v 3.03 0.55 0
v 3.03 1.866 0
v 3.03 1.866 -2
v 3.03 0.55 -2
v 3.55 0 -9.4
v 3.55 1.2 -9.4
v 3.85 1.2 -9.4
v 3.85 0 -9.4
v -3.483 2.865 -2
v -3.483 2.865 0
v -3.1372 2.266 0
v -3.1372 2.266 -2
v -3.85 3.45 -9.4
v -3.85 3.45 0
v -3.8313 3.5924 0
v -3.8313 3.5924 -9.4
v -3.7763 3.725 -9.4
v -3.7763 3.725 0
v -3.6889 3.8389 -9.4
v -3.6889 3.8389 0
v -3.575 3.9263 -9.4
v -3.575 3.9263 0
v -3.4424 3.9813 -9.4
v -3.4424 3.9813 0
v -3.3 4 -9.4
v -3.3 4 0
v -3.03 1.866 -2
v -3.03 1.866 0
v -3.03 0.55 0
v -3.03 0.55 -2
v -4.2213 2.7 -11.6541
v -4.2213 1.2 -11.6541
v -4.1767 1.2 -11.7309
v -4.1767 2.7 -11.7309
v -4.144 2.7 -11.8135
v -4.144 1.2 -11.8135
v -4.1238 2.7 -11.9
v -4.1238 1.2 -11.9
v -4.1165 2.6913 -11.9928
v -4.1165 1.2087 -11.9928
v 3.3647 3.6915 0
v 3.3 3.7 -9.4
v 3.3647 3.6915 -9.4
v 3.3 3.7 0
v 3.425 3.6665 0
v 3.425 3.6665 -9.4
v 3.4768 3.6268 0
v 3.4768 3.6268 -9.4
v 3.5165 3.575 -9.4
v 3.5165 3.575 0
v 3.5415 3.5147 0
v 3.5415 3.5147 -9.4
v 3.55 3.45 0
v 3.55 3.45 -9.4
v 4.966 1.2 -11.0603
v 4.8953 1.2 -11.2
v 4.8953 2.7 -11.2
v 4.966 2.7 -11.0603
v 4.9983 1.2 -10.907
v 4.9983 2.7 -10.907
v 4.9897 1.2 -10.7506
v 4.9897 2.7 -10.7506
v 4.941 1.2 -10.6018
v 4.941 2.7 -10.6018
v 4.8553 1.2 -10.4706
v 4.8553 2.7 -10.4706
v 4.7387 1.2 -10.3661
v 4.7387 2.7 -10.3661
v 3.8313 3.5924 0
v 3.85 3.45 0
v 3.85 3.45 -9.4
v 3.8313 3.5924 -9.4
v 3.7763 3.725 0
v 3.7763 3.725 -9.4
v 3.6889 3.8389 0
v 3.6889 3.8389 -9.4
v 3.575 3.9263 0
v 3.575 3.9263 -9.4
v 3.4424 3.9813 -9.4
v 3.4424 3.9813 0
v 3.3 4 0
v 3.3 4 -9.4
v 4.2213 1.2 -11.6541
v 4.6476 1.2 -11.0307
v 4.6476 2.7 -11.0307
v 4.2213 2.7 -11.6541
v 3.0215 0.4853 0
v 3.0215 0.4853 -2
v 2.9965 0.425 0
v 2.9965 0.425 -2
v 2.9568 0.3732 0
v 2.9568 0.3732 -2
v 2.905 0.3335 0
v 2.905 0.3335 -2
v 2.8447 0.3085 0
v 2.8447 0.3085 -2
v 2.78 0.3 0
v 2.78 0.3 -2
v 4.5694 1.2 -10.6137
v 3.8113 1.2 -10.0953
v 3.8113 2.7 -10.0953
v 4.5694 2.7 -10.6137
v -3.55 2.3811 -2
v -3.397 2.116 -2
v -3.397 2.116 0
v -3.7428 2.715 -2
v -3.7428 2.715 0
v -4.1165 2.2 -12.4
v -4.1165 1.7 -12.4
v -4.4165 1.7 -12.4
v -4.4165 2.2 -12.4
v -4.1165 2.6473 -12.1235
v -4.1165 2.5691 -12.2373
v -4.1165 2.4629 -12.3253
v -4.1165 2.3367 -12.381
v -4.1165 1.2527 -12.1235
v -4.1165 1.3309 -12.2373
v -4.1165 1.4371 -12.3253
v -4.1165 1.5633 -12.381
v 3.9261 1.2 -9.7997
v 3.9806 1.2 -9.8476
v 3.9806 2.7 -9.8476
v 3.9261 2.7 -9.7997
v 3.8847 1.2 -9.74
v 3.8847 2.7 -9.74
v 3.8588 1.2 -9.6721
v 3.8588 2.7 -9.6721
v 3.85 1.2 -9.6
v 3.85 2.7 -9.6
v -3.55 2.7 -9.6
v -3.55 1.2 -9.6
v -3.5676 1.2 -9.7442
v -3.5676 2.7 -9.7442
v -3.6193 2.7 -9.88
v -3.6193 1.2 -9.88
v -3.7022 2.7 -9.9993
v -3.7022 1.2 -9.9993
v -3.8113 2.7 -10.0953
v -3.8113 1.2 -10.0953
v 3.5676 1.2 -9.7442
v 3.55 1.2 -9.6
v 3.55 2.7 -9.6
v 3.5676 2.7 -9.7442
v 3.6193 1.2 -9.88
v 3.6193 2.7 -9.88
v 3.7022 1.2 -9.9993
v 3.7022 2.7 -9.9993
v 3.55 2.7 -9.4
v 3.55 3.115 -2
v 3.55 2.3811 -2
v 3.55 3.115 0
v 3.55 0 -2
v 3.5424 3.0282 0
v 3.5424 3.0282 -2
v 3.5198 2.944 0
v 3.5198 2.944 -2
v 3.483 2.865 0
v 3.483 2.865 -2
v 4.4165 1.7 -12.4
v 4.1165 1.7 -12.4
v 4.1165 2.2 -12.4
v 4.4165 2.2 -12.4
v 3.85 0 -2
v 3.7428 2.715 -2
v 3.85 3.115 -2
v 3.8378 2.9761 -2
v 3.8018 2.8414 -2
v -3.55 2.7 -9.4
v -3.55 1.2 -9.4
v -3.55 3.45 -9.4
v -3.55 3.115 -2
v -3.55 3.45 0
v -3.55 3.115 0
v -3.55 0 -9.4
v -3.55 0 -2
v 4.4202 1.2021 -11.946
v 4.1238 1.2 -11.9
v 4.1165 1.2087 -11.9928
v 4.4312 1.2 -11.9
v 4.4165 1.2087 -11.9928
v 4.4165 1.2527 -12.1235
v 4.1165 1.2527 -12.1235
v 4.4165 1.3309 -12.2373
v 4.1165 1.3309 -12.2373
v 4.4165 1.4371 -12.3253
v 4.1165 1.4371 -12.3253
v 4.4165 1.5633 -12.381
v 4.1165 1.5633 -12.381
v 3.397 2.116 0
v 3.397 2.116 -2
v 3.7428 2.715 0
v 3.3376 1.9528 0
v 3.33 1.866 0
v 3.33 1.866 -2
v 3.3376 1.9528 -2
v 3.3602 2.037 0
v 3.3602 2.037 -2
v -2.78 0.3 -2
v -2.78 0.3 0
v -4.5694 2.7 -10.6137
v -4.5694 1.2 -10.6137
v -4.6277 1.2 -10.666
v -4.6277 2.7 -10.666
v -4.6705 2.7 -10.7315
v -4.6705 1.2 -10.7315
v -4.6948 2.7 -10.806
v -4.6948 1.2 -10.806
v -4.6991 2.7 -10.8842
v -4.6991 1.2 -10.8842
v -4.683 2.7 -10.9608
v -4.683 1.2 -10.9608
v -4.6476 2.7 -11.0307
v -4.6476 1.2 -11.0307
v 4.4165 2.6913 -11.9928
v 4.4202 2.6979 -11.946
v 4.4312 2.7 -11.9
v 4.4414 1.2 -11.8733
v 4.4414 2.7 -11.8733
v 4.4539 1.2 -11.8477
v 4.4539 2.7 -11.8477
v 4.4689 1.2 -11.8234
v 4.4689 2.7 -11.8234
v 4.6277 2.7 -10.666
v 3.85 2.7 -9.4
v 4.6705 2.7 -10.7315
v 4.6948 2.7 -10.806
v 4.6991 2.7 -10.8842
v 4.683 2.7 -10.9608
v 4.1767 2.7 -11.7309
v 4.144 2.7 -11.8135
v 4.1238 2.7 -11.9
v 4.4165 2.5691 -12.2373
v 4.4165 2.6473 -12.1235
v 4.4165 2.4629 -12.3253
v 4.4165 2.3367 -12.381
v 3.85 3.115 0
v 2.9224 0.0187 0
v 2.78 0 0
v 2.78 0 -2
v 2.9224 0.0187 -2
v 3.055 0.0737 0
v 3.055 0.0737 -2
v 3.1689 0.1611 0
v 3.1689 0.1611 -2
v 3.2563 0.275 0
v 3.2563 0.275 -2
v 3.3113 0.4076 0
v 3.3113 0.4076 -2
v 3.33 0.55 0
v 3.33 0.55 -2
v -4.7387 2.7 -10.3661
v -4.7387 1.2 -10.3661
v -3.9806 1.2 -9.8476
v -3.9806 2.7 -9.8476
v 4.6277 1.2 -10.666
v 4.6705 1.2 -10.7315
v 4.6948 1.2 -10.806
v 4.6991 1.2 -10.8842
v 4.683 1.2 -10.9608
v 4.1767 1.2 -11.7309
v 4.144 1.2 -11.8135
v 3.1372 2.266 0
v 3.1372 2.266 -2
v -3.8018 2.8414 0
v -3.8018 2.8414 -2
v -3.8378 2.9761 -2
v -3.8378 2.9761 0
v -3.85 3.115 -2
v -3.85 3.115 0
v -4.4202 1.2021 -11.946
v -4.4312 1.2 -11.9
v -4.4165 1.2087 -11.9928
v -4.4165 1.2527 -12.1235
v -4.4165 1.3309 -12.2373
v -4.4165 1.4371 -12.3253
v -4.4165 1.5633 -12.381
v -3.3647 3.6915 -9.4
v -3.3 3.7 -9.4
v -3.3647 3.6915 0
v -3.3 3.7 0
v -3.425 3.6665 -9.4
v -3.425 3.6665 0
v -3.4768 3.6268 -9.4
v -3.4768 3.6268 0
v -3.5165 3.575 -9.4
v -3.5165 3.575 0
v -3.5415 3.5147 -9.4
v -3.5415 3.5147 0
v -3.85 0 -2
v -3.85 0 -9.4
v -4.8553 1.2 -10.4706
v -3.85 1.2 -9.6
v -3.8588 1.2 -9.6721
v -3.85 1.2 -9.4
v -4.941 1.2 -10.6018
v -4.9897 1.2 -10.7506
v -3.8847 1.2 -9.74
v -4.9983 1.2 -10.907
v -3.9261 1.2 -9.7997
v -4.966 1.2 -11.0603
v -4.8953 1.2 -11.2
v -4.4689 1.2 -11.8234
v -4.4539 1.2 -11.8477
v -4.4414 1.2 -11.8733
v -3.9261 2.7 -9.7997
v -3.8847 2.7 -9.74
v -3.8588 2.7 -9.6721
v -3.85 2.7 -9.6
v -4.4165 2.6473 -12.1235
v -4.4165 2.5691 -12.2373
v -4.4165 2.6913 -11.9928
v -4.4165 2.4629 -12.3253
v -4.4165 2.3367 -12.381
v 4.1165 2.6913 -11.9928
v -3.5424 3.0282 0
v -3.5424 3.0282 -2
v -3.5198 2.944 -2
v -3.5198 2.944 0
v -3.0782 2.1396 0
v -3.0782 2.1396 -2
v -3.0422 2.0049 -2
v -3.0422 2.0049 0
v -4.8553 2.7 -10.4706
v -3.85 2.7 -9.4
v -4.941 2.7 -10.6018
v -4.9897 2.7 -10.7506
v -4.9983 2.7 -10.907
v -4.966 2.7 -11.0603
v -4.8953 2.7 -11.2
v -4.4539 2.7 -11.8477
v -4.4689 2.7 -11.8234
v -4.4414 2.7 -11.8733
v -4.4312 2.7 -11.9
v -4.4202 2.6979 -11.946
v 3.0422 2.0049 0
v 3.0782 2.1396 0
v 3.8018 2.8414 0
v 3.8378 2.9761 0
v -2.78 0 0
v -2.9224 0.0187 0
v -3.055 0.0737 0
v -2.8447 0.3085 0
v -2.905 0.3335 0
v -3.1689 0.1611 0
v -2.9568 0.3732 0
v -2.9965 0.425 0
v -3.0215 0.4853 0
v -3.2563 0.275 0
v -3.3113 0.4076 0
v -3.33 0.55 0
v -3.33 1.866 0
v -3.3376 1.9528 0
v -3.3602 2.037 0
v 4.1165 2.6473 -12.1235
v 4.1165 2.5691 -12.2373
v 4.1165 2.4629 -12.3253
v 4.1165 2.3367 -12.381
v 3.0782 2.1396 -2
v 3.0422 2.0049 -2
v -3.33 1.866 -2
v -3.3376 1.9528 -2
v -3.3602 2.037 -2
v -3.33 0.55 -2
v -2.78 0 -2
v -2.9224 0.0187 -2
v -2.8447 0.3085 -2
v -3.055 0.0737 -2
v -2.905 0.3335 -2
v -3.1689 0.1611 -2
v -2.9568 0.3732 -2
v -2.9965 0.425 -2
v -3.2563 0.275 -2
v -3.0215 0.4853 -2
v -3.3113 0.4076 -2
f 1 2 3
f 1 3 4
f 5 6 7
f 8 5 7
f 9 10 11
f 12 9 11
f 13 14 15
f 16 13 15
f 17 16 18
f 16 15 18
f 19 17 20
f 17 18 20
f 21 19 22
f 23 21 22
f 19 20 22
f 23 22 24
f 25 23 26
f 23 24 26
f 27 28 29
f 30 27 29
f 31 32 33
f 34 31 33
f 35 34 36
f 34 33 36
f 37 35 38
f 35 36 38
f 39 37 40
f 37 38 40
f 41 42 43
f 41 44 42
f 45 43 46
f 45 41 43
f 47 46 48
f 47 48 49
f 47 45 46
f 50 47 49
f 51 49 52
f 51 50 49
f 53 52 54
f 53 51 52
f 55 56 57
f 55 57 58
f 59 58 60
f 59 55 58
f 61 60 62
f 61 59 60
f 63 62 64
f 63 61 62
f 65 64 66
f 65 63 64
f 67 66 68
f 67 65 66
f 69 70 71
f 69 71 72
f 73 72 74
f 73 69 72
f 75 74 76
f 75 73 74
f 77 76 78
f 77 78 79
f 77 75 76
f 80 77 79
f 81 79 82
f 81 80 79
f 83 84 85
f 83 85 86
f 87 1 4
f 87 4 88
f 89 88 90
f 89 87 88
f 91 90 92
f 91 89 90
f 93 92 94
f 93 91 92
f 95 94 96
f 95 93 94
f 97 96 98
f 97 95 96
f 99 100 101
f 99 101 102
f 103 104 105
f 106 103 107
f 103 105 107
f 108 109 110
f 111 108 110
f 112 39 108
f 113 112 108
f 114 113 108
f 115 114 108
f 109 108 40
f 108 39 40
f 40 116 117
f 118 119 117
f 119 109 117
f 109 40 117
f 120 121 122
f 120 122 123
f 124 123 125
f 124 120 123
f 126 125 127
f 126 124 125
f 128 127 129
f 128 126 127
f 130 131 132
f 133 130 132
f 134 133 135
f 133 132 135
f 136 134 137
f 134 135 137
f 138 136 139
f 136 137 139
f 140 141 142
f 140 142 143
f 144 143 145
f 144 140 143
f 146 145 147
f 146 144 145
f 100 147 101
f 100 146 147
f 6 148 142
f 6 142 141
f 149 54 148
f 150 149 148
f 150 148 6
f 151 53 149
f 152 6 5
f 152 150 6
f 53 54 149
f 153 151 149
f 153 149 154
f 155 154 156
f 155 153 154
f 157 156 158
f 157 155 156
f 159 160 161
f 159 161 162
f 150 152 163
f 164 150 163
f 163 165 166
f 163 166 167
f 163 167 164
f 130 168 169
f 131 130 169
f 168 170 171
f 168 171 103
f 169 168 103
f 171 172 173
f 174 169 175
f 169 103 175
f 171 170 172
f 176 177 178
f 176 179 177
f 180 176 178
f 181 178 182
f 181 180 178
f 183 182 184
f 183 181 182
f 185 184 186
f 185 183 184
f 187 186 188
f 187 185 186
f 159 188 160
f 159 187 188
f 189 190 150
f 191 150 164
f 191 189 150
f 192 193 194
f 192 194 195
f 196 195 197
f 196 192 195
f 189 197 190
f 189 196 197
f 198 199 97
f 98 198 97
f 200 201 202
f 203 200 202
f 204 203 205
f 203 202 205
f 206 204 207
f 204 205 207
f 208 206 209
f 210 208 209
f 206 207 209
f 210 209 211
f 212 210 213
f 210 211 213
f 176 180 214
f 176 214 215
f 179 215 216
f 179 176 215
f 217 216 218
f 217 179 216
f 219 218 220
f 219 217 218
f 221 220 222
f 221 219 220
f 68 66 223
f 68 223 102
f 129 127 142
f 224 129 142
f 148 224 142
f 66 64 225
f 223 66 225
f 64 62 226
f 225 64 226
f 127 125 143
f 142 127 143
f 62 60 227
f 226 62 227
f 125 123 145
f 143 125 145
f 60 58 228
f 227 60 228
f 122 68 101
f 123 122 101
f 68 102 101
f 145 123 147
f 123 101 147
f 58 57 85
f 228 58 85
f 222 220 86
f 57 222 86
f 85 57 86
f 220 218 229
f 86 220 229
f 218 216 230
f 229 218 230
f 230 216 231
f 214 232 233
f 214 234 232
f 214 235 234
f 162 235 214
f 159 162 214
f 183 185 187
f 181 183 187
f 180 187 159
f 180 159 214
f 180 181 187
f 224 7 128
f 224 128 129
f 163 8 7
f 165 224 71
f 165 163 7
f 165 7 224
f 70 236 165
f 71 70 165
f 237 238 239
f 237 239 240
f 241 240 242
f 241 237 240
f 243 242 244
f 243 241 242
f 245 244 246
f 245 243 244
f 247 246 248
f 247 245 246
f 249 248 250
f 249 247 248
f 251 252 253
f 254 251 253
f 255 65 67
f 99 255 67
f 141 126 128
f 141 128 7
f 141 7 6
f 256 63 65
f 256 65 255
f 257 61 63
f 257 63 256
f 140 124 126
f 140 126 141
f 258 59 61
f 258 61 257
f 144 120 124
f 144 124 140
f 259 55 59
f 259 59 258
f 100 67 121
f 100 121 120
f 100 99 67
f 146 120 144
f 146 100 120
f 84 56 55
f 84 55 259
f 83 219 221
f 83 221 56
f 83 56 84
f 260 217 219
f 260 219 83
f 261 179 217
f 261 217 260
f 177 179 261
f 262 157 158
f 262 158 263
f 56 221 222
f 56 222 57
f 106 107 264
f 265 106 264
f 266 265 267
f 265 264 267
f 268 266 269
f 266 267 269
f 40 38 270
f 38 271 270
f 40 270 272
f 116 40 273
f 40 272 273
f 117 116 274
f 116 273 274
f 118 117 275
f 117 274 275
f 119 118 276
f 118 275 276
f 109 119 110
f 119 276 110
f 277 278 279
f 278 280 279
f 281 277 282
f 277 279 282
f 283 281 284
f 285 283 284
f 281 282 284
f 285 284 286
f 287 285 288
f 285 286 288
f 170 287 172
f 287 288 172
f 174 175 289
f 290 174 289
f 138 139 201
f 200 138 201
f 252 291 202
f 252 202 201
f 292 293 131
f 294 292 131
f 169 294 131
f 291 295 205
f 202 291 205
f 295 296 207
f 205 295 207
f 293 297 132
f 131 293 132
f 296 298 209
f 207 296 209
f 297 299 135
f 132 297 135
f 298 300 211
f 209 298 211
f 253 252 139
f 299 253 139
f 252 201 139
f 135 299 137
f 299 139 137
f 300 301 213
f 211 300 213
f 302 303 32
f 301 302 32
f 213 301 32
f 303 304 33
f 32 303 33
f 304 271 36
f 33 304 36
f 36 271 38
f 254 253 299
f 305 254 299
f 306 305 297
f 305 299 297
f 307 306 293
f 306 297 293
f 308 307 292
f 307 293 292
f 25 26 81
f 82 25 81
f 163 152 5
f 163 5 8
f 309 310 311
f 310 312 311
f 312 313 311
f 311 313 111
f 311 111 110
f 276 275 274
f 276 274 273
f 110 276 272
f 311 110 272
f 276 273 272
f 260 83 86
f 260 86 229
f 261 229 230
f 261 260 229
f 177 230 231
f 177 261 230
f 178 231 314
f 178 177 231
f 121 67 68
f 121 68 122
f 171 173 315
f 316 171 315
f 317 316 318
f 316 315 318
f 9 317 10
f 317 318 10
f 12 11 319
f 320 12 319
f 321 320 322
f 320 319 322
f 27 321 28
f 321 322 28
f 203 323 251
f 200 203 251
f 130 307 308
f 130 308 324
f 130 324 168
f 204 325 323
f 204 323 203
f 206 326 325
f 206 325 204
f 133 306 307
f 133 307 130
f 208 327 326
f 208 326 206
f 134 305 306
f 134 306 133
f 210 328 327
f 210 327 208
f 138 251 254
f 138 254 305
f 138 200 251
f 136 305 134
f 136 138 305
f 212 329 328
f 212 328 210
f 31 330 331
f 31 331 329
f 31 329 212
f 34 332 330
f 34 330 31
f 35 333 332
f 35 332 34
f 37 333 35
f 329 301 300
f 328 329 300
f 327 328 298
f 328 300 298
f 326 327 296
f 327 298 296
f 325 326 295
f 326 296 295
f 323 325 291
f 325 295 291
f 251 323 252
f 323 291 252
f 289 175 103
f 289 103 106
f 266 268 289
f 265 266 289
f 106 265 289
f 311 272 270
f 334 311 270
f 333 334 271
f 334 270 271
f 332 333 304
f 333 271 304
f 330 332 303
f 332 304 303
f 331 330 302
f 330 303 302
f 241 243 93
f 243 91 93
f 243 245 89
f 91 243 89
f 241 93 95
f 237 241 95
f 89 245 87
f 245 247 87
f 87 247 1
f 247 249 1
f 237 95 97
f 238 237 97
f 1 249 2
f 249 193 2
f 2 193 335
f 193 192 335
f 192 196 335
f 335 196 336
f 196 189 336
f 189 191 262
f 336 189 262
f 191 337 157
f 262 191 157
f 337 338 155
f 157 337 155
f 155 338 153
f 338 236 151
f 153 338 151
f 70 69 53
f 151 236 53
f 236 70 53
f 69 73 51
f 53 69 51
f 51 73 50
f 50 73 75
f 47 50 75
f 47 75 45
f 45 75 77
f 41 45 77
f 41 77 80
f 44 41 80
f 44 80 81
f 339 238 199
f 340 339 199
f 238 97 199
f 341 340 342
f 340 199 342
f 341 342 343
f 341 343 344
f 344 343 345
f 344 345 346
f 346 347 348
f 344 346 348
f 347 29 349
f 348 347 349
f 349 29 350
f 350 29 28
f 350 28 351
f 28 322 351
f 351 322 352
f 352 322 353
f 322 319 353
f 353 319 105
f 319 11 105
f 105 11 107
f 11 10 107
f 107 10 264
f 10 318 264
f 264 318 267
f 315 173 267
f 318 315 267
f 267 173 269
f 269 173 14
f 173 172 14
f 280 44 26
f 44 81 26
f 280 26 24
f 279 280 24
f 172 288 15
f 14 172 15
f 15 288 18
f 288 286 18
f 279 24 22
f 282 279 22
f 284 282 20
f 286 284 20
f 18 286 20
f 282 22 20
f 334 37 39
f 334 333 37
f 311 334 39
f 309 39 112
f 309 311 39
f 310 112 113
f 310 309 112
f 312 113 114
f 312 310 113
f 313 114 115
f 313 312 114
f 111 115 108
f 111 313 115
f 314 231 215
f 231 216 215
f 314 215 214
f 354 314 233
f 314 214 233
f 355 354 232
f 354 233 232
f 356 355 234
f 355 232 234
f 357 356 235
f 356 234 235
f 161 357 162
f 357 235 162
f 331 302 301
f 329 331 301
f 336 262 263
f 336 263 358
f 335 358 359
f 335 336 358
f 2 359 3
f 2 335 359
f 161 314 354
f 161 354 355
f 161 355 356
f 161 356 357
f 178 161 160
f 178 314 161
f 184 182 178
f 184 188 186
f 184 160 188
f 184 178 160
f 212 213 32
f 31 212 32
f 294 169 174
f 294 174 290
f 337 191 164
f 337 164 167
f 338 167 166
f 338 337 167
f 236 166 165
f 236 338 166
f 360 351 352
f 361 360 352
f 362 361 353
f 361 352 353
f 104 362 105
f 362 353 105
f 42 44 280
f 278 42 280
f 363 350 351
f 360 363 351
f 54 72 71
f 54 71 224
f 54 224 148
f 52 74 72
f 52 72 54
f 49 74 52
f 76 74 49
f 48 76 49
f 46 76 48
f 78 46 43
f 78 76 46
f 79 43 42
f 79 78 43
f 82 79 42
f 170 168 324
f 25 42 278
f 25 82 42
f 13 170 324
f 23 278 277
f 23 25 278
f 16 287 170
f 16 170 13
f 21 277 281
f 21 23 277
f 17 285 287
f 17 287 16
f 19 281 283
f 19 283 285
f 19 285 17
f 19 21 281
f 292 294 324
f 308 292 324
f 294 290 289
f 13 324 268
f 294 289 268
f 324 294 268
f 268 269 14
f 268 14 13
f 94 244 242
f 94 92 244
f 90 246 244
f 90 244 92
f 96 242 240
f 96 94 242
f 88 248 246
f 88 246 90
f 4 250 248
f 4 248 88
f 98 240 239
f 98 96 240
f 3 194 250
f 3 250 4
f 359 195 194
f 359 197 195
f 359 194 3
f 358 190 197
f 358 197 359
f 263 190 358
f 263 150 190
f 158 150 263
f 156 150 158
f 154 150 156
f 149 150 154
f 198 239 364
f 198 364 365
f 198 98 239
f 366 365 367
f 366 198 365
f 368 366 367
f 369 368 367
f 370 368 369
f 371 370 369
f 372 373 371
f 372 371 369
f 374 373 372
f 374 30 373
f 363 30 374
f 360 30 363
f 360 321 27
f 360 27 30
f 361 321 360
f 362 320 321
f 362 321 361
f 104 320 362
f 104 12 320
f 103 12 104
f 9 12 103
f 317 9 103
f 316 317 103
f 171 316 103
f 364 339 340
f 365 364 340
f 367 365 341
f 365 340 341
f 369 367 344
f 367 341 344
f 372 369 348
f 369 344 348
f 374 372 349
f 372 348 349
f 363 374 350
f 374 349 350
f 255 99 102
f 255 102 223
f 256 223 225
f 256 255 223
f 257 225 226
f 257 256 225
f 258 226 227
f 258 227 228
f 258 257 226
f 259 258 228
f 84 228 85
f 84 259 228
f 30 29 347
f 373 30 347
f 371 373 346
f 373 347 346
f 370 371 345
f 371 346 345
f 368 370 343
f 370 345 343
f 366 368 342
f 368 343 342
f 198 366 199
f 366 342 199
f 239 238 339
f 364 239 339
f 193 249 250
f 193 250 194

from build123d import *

# Parameters (mm, degrees)
BOSS_EXTRUDE1_DEPTH = 2
BOSS_EXTRUDE2_DEPTH = 7.4
BOSS_EXTRUDE3_DEPTH = 1.5
FILLET1_R           = 0.5


with BuildPart() as part:
    # Sketch2 → Boss-Extrude1 (new body)
    with BuildSketch(Plane.XY):
        with BuildLine():
            Line((0, 0), (2.78, 0))
            ThreePointArc((2.78, 0), (3.16890873, 0.16109127), (3.33, 0.55))
            Line((3.33, 0.55), (3.33, 1.866025404))
            ThreePointArc((3.33, 1.866025404), (3.347037087, 1.995434926), (3.396987298, 2.116025404))
            Line((3.396987298, 2.116025404), (3.742820323, 2.715025774))
            ThreePointArc((3.742820323, 2.715025774), (3.822740661, 2.907970538), (3.85, 3.115025774))
            Line((3.85, 3.115025774), (3.85, 3.45))
            ThreePointArc((3.85, 3.45), (3.68890873, 3.83890873), (3.3, 4))
            Line((3.3, 4), (0, 4))
            Line((0, 4), (0, 3.7))
            Line((0, 3.7), (3.3, 3.7))
            ThreePointArc((3.3, 3.7), (3.476776695, 3.626776695), (3.55, 3.45))
            Line((3.55, 3.45), (3.55, 3.115025774))
            ThreePointArc((3.55, 3.115025774), (3.532962913, 2.985616251), (3.483012702, 2.865025774))
            Line((3.483012702, 2.865025774), (3.137179677, 2.266025404))
            ThreePointArc((3.137179677, 2.266025404), (3.057259339, 2.07308064), (3.03, 1.866025404))
            Line((3.03, 1.866025404), (3.03, 0.55))
            ThreePointArc((3.03, 0.55), (2.956776695, 0.373223305), (2.78, 0.3))
            Line((2.78, 0.3), (0, 0.3))
            Line((0, 0.3), (0, 0))
        make_face()
    extrude(amount=-BOSS_EXTRUDE1_DEPTH)

    # Sketch4 → Boss-Extrude2 (add)
    with BuildSketch(Plane(origin=(0, 0, -2), x_dir=(-1, 0, 0), z_dir=(0, 0, -1))):
        with BuildLine():
            Line((-3.55, 0), (-3.85, 0))
            Line((-3.85, 0), (-3.85, 3.45))
            ThreePointArc((-3.85, 3.45), (-3.68890873, 3.83890873), (-3.3, 4))
            Line((-3.3, 4), (0, 4))
            Line((0, 4), (0, 3.7))
            Line((0, 3.7), (-3.3, 3.7))
            ThreePointArc((-3.3, 3.7), (-3.476776695, 3.626776695), (-3.55, 3.45))
            Line((-3.55, 3.45), (-3.55, 0))
        make_face()
    extrude(amount=BOSS_EXTRUDE2_DEPTH)

    # Sketch5 → Boss-Extrude3 (add)
    with BuildSketch(Plane(origin=(0, 1.2, 0), x_dir=(1, 0, 0), z_dir=(0, 1, 0))):
        with BuildLine():
            Line((3.85, 9.4), (3.55, 9.4))
            Line((3.55, 9.4), (3.55, 9.6))
            ThreePointArc((3.55, 9.6), (3.619329194, 9.879979456), (3.811294986, 10.095256412))
            Line((3.811294986, 10.095256412), (4.569352507, 10.613690656))
            ThreePointArc((4.569352507, 10.613690656), (4.69484989, 10.805969585), (4.647628206, 11.030671369))
            Line((4.647628206, 11.030671369), (4.221287524, 11.654069155))
            ThreePointArc((4.221287524, 11.654069155), (4.143327639, 11.815508616), (4.116543936, 11.99277417))
            Line((4.116543936, 11.99277417), (4.116543936, 12.4))
            Line((4.116543936, 12.4), (4.416543936, 12.4))
            Line((4.416543936, 12.4), (4.416543936, 11.99277417))
            ThreePointArc((4.416543936, 11.99277417), (4.429935787, 11.904141393), (4.46891573, 11.823421663))
            Line((4.46891573, 11.823421663), (4.895256412, 11.200023877))
            ThreePointArc((4.895256412, 11.200023877), (4.98969978, 10.750620308), (4.738705014, 10.366062451))
            Line((4.738705014, 10.366062451), (3.980647493, 9.847628206))
            ThreePointArc((3.980647493, 9.847628206), (3.884664597, 9.739989728), (3.85, 9.6))
            Line((3.85, 9.6), (3.85, 9.4))
        make_face()
    extrude(amount=BOSS_EXTRUDE3_DEPTH)

    # Fillet1
    fillet1_edges = [part.edges().sort_by_distance(p)[0] for p in [
        (4.266543936, 1.2, -12.4),
        (4.266543936, 2.7, -12.4),
    ]]
    fillet(fillet1_edges, radius=FILLET1_R)

    # Mirror1: part across plane


with BuildPart() as part_1:
    add(part.part)
    add(part.part.mirror(Plane(origin=(0, 4, -2), x_dir=(0, 0, 1), z_dir=(-1, 0, 0))))


solid = part_1.part
